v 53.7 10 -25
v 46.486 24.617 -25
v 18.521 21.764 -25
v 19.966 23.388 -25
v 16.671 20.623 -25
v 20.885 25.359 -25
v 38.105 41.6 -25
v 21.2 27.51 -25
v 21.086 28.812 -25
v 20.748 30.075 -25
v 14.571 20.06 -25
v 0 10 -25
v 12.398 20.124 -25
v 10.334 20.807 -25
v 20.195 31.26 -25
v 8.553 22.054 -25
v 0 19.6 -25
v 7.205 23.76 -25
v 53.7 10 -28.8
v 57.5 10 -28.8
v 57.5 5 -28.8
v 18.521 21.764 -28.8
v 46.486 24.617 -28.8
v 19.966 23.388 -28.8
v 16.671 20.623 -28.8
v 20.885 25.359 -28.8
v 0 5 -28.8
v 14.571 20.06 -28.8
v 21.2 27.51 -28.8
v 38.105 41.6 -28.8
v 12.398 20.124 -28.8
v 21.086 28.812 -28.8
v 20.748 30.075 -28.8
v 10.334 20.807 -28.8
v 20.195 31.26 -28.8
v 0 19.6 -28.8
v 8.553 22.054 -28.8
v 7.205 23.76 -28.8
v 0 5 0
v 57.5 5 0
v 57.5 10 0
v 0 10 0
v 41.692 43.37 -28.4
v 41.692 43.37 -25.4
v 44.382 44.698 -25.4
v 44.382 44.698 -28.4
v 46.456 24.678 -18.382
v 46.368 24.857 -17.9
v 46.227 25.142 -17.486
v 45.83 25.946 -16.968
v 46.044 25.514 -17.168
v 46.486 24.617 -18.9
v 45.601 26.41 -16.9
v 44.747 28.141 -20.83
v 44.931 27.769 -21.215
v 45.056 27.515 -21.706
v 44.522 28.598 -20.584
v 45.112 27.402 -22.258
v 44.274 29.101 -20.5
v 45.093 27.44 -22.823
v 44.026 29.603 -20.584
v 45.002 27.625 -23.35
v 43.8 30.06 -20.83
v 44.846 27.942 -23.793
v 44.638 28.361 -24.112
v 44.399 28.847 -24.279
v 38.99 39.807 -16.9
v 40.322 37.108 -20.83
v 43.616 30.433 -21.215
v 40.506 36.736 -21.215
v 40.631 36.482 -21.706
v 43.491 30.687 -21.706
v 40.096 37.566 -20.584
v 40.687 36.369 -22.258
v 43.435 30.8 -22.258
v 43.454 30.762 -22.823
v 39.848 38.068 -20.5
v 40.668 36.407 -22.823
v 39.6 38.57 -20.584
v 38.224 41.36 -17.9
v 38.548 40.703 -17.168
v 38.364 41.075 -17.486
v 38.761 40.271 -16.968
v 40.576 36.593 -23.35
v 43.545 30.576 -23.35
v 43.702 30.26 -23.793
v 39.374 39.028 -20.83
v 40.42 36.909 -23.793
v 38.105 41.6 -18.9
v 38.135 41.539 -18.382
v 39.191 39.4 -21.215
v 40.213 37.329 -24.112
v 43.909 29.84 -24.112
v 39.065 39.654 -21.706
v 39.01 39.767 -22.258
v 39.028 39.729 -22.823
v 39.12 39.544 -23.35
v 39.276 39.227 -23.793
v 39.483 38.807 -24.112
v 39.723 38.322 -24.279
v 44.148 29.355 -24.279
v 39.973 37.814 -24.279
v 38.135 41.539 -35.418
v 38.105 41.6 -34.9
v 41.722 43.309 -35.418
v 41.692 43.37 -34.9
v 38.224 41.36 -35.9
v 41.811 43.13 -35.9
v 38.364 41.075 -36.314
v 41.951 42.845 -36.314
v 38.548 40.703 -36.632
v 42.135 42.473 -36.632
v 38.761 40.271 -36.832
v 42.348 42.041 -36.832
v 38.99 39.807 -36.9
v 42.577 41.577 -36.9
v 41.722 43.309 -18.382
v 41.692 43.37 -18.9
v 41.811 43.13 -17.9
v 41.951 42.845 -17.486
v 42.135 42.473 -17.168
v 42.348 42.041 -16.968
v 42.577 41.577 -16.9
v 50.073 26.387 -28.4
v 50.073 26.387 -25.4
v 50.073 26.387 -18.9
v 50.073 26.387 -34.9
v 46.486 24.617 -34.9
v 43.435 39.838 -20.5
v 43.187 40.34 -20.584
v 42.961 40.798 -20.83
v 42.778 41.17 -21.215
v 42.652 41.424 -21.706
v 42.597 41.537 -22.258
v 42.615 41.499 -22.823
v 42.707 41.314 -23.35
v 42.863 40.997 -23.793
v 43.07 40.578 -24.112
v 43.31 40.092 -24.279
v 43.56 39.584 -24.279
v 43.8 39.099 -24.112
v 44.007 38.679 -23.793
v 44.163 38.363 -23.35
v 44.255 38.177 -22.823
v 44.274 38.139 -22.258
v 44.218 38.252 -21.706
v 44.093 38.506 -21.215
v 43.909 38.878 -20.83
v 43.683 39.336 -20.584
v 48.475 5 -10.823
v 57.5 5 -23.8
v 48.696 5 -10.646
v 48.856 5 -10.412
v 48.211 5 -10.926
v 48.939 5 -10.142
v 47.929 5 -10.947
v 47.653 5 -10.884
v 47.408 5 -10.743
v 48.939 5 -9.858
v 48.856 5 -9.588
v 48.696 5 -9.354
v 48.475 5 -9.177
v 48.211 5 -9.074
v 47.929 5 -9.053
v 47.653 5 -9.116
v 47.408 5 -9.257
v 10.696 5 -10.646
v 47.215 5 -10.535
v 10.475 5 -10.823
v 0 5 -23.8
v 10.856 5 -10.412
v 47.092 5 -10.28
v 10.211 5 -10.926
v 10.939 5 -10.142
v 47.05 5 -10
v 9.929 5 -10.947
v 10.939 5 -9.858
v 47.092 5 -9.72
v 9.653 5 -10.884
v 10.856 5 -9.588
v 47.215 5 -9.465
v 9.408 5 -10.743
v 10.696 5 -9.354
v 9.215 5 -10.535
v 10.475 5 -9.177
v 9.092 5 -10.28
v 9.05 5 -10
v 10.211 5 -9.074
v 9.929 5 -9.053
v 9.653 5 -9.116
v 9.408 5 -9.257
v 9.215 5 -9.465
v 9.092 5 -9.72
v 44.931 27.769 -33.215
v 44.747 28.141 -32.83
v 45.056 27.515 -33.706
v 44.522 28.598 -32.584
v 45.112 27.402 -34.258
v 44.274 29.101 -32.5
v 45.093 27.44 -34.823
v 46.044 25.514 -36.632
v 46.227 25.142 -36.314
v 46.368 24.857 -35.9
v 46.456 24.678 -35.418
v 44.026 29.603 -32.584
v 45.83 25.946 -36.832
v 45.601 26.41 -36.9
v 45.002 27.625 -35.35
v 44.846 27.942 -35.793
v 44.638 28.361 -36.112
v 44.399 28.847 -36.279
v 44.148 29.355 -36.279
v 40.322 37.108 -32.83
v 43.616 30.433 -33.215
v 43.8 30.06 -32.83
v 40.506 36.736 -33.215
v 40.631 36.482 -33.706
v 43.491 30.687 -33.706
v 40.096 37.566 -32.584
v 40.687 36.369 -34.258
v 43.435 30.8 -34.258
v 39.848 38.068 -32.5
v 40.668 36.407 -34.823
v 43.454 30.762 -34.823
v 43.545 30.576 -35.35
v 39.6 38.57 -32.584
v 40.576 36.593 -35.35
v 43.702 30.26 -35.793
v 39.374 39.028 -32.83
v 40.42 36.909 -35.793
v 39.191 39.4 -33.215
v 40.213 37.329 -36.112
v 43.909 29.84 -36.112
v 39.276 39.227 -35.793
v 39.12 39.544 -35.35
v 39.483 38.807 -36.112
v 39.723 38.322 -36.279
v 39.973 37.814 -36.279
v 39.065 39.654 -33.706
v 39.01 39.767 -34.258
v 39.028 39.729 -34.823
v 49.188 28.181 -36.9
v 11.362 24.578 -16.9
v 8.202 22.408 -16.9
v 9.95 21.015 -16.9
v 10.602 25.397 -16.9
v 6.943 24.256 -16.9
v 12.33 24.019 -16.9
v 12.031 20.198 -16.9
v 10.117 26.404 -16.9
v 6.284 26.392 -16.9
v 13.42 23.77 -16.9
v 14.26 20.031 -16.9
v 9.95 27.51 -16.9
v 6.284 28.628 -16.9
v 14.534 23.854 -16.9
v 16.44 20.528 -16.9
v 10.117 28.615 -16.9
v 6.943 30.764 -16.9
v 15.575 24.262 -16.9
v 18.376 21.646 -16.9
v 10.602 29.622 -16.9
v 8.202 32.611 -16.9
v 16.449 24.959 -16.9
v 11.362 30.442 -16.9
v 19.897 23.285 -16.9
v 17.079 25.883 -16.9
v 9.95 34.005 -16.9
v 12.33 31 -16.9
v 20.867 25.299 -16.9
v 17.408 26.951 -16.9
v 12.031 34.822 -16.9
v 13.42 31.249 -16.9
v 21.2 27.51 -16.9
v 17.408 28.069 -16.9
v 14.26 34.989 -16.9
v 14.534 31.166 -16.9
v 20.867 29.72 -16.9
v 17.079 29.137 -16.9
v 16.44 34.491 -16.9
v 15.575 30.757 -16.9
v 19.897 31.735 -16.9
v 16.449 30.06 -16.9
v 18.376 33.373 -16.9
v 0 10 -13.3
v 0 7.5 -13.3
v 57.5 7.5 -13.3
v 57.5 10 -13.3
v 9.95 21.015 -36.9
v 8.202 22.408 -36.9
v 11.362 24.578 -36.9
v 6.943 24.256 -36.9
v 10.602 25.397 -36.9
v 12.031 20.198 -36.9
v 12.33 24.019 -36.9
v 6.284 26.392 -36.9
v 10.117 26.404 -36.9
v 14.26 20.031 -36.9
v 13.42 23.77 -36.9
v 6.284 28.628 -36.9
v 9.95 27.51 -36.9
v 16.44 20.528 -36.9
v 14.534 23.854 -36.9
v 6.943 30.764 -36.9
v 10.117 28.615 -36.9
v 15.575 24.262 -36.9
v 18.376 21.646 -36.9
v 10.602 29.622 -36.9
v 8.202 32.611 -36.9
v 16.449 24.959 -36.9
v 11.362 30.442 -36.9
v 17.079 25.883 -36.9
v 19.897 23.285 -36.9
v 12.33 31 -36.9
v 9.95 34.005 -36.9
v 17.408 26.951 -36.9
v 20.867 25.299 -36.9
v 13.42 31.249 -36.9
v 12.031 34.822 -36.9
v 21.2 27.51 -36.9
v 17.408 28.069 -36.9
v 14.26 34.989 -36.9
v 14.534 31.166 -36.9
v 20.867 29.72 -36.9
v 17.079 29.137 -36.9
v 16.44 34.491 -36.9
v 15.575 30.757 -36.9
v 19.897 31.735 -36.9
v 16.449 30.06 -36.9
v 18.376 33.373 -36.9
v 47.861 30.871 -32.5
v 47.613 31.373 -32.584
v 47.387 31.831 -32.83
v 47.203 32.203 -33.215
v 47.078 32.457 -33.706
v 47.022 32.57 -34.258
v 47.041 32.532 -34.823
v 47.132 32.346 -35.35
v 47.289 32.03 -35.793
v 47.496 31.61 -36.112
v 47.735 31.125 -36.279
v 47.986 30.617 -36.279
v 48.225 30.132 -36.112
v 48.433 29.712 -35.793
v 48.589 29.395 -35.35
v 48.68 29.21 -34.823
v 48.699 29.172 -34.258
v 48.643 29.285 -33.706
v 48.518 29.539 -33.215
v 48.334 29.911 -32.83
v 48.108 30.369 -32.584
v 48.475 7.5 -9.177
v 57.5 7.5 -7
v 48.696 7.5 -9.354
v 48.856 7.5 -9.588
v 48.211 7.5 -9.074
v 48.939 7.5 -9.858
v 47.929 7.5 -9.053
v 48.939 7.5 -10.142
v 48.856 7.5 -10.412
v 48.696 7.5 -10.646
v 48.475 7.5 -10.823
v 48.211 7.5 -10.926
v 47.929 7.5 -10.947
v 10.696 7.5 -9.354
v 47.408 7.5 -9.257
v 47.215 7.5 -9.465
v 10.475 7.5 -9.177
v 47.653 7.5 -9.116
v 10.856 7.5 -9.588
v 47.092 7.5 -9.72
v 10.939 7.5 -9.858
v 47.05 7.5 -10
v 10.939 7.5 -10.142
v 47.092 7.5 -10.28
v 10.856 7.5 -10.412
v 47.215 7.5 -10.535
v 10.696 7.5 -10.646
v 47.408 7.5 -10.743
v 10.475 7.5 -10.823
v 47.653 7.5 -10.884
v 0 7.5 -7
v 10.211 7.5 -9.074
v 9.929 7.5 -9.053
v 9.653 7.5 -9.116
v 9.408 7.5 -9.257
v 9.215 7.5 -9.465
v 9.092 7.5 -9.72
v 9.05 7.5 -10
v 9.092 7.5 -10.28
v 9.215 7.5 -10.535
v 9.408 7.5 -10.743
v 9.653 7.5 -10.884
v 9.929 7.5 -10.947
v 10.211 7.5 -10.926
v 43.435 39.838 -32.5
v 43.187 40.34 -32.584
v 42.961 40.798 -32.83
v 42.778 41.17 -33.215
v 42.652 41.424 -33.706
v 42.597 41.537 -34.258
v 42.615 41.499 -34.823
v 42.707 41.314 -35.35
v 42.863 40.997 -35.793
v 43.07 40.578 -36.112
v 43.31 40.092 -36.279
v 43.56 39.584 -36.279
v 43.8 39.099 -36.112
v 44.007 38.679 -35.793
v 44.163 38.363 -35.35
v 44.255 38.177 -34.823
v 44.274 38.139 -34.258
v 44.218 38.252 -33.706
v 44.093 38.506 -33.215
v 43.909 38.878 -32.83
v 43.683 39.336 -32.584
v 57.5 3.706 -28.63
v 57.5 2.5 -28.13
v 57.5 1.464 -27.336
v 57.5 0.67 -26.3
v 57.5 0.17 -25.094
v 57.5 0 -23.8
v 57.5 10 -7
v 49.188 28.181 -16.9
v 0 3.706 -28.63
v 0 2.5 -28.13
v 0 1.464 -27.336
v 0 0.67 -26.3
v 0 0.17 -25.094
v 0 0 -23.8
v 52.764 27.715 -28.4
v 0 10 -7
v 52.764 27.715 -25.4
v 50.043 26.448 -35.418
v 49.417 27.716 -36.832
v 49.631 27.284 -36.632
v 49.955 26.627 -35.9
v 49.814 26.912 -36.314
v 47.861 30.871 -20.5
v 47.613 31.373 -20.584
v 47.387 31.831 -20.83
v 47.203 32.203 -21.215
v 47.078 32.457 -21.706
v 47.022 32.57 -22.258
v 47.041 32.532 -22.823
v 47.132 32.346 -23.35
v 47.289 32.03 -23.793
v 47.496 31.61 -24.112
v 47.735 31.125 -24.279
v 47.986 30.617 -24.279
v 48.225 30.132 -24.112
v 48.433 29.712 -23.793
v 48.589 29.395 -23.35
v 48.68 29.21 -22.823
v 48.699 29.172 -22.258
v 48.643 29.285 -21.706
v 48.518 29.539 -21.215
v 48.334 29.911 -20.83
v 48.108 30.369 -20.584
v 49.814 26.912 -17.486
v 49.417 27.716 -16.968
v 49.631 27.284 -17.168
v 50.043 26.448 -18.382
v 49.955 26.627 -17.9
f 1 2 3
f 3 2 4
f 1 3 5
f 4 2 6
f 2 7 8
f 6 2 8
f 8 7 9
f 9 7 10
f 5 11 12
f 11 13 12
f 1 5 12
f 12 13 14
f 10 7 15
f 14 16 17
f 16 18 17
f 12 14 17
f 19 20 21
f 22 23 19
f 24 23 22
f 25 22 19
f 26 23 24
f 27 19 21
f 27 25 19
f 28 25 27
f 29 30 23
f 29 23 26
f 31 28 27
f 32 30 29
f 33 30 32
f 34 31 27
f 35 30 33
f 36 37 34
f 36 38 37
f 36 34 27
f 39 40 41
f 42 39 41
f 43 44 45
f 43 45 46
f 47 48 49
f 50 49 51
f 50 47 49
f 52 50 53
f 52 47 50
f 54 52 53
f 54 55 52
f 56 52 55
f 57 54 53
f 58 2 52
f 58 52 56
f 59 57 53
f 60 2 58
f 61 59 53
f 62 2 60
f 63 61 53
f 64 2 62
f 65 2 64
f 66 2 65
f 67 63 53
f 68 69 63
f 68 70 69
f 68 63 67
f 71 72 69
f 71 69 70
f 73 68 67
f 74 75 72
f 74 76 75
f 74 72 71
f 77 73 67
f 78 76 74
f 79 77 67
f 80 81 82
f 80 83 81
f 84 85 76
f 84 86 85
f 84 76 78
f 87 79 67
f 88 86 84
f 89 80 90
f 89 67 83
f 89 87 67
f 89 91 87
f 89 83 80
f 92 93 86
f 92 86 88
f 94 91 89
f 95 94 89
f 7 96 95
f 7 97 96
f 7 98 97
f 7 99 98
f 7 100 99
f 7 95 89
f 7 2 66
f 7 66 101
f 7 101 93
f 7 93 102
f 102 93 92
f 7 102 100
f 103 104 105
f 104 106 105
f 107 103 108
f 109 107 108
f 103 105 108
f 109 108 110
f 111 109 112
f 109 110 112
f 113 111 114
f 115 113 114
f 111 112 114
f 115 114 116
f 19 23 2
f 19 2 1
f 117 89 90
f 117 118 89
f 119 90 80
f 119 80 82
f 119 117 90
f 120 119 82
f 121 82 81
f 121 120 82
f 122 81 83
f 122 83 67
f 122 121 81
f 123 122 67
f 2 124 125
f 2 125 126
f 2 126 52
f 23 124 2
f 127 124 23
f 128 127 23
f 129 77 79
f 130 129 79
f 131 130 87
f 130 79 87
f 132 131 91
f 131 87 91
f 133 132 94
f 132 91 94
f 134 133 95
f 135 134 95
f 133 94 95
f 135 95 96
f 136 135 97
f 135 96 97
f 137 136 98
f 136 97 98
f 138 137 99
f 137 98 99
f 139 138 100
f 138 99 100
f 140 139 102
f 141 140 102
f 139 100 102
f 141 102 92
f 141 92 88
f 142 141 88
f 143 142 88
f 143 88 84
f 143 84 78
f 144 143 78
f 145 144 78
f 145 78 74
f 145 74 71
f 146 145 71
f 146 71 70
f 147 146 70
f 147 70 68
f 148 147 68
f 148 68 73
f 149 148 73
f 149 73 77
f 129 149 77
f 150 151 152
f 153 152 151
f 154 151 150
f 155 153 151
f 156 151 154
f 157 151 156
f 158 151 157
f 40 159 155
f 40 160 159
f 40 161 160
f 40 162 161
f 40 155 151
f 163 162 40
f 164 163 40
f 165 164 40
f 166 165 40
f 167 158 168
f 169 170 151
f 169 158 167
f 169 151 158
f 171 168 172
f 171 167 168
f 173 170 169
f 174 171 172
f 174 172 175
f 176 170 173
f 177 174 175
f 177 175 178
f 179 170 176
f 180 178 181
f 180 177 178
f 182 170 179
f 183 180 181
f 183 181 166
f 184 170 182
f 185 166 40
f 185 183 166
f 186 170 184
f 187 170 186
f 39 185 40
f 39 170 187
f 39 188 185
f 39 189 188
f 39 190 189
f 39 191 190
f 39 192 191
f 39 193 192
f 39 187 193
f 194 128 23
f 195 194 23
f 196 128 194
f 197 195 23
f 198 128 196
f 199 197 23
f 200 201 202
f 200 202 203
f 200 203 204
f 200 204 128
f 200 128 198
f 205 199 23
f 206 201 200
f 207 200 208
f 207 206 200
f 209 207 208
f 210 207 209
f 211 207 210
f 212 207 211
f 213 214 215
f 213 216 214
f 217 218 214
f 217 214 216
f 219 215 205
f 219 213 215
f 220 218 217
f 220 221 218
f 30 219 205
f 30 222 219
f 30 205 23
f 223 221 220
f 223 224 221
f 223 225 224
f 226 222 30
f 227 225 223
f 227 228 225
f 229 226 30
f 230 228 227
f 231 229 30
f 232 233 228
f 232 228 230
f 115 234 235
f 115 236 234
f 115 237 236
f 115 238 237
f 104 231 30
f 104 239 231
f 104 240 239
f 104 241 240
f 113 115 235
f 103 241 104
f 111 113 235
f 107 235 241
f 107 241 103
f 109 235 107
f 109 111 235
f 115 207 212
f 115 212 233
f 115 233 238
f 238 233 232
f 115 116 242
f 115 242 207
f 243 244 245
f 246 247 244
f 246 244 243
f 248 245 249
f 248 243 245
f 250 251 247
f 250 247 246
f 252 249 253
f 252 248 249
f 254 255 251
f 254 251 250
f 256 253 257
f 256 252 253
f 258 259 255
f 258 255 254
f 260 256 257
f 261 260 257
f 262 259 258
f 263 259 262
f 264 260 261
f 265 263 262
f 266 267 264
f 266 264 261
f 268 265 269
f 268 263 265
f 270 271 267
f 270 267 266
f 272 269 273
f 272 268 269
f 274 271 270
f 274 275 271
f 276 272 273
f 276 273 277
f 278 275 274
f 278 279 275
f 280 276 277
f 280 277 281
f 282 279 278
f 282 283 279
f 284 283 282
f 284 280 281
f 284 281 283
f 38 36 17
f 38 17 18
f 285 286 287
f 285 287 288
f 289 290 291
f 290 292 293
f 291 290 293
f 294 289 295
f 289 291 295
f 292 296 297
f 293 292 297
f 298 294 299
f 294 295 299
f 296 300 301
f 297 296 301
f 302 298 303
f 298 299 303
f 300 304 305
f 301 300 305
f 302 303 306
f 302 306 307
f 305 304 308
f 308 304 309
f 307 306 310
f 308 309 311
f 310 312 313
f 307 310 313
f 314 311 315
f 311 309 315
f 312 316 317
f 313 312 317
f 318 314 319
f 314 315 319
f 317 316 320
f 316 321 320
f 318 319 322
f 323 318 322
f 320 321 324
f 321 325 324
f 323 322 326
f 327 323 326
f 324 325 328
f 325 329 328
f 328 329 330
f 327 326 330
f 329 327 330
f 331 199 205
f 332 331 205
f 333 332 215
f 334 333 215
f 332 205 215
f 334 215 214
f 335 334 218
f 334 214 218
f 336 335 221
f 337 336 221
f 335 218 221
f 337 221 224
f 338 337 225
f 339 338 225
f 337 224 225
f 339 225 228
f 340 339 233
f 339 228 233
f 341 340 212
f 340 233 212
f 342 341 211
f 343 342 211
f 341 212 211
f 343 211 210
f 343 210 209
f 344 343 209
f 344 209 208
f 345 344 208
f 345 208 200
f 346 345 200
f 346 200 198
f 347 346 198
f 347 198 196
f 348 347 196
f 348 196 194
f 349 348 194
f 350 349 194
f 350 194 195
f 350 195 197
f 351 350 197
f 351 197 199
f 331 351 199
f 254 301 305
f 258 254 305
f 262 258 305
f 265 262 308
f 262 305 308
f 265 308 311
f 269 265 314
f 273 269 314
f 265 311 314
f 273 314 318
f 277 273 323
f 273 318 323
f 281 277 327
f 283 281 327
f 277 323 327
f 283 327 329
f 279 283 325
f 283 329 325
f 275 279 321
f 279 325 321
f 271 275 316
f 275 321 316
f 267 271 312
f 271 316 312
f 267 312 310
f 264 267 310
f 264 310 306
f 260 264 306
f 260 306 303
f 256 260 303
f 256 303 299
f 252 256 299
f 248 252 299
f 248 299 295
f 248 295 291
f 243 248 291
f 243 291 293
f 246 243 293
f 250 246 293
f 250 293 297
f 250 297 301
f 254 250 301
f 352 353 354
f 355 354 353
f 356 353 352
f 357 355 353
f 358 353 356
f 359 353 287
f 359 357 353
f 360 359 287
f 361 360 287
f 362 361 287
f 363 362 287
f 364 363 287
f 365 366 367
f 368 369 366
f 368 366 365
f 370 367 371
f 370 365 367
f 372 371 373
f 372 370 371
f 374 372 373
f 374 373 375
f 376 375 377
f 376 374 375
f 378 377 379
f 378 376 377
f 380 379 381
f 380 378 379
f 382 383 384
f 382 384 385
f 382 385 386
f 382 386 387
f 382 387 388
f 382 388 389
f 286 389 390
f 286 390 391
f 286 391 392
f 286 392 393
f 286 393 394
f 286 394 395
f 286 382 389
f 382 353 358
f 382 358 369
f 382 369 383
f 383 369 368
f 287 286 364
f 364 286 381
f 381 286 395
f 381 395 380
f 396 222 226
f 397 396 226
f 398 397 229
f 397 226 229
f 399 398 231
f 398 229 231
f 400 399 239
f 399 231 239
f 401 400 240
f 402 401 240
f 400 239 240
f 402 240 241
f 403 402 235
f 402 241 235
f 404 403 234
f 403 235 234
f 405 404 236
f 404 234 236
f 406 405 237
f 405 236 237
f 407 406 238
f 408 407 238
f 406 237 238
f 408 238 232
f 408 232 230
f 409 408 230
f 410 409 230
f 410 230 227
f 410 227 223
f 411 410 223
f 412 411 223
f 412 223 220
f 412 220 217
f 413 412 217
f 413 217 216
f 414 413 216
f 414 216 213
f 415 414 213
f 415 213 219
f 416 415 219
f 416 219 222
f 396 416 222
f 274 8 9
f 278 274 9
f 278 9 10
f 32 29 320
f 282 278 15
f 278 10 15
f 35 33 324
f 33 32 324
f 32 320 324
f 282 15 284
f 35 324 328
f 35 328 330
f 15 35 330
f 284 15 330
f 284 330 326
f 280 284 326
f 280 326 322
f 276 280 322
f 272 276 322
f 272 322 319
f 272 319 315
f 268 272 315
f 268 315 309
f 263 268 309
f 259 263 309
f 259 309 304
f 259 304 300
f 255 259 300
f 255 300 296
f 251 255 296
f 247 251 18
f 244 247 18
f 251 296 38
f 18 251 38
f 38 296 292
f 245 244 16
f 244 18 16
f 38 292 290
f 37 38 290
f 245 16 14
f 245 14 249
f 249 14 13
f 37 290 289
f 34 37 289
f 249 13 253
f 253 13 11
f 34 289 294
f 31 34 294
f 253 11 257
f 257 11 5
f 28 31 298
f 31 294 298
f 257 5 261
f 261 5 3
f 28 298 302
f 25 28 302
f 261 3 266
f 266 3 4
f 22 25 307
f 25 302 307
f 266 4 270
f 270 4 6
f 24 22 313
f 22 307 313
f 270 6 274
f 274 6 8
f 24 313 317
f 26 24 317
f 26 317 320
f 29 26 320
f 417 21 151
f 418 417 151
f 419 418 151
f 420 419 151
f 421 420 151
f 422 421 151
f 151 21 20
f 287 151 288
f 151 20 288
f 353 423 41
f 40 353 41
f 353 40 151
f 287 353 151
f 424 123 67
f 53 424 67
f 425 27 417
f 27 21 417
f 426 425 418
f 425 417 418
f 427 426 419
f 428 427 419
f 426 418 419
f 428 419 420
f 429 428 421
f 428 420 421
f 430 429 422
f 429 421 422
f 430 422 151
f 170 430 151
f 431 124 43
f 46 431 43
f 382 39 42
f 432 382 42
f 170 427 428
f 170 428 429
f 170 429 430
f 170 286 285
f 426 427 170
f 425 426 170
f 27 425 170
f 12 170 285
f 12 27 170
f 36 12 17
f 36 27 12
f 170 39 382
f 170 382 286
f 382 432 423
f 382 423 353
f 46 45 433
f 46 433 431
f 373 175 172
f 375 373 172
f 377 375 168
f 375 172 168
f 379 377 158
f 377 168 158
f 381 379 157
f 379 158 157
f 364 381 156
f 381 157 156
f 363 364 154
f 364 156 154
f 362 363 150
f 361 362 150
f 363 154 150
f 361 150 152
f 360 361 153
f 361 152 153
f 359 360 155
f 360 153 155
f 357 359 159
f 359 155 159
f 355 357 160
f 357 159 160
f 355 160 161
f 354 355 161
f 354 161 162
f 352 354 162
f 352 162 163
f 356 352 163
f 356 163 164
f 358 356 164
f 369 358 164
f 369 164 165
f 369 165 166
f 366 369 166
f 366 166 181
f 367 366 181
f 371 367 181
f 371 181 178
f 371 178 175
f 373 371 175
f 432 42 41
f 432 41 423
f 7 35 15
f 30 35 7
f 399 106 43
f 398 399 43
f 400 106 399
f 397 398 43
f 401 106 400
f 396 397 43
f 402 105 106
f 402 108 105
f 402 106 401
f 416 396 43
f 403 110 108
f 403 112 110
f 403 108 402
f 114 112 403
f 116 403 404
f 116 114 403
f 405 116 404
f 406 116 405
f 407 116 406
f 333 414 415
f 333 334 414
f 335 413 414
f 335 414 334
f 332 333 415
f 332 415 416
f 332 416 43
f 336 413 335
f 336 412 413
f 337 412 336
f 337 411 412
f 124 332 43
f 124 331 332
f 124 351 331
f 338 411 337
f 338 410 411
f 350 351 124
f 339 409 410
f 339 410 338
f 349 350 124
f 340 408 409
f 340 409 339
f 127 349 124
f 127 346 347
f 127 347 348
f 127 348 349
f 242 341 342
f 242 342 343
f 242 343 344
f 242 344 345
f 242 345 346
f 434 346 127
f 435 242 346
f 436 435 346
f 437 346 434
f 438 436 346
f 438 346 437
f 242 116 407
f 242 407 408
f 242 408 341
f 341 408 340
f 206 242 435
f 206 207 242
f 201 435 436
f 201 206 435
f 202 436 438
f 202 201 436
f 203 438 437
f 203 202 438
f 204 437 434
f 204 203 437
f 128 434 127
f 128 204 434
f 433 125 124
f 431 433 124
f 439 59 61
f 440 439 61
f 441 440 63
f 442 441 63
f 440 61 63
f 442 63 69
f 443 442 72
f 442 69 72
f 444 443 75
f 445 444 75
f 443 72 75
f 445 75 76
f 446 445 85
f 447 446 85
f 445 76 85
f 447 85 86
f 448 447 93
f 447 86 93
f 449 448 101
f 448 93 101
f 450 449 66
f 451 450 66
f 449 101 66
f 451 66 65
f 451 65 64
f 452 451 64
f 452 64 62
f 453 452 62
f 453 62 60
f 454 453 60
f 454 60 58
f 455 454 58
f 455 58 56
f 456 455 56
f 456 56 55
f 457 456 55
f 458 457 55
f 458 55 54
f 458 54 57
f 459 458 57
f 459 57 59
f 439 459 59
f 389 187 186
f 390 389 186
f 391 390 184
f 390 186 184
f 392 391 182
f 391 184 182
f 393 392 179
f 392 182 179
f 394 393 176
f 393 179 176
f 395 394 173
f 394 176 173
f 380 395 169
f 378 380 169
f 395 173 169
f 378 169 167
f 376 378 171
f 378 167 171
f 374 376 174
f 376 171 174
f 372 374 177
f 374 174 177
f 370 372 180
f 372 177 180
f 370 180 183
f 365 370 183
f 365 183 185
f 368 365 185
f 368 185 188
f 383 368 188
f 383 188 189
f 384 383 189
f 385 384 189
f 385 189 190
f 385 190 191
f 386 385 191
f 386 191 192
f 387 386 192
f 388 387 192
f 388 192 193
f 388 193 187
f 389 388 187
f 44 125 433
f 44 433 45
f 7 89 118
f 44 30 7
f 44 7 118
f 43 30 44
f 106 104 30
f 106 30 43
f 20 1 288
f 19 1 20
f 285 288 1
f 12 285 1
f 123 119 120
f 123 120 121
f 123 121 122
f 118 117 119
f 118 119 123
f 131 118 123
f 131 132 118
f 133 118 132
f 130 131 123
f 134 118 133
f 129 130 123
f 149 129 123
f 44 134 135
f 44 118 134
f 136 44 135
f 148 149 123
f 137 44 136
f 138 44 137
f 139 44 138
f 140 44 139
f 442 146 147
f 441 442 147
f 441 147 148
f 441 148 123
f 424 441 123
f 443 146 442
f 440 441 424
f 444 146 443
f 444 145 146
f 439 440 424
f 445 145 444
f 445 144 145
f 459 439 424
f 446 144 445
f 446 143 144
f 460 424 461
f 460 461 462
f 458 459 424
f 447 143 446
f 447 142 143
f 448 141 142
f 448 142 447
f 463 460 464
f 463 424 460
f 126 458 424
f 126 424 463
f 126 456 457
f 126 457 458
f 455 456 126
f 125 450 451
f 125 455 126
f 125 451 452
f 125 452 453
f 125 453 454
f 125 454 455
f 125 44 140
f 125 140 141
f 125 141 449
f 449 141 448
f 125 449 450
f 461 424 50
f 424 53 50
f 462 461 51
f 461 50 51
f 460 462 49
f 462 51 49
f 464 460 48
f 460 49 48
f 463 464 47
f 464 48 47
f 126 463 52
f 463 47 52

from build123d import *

# Parameters (mm, degrees)
BOSS_EXTRUDE1_DEPTH      = 57.5
FILLET1_R                = 5
BOSS_EXTRUDE2_DEPTH      = 3.8
BOSS_EXTRUDE3_DEPTH      = 8.1
BOSS_EXTRUDE3_DEPTH_BACK = 11.9
SKETCH3_R                = 7.5
HOLE1_D                  = 7.5
BOSS_EXTRUDE4_DEPTH      = 8.1
BOSS_EXTRUDE4_DEPTH_BACK = 11.9
SKETCH7_W                = 3
SKETCH7_H                = 18.938620175
BOSS_EXTRUDE5_DEPTH      = 3
HOLE2_D                  = 3.8
HOLE2_DEPTH              = 4
FILLET2_R                = 2
HOLE3_D                  = 1.9
LPATTERN1_COUNT          = 2
LPATTERN1_PITCH          = 38


with BuildPart() as part:
    # Sketch1 → Boss-Extrude1 (new body)
    with BuildSketch(Plane(origin=(0, 0, 0), x_dir=(0, 0, -1), z_dir=(1, 0, 0))):
        Polygon((0, 5), (0, 10), (7, 10), (7, 7.5), (13.3, 7.5), (13.3, 10), (28.8, 10), (28.8, 0), (23.8, 0), (23.8, 5), align=None)
    extrude(amount=BOSS_EXTRUDE1_DEPTH)

    # Fillet1
    fillet1_edges = [part.edges().sort_by_distance(p)[0] for p in [
        (28.75, 0, -28.8),
    ]]
    fillet(fillet1_edges, radius=FILLET1_R - 0.0001)  # a hair under: the kernel refuses the full size

    # Sketch2 → Boss-Extrude2 (add)
    with BuildSketch(Plane(origin=(0, 0, -28.8), x_dir=(-1, 0, 0), z_dir=(0, 0, -1))):
        Polygon((-53.7, 10), (0, 10), (0, 19.6), (-38.105117767, 41.6), align=None)
    extrude(amount=-BOSS_EXTRUDE2_DEPTH)

    # Sketch3 → Boss-Extrude3 (add, two sides: drawn at the far end of the back side and taken through both)
    with BuildSketch(Plane.XY.offset(-25).offset(-BOSS_EXTRUDE3_DEPTH_BACK)):
        with Locations((13.7, 27.509698688)):
            Circle(SKETCH3_R)
    extrude(amount=BOSS_EXTRUDE3_DEPTH + BOSS_EXTRUDE3_DEPTH_BACK)

    # Hole1 (through all)
    with Locations(Plane.XY.offset(-16.9)):
        with Locations((13.7, 27.509698688)):
            Hole(HOLE1_D / 2)

    # Sketch6 → Boss-Extrude4 (add, two sides: drawn at the far end of the back side and taken through both)
    with BuildSketch(Plane.XY.offset(-25).offset(-BOSS_EXTRUDE4_DEPTH_BACK)):
        Polygon((38.105117767, 41.6), (41.692091359, 43.370203505), (50.073394311, 26.387120893), (46.486420719, 24.616917389), align=None)
    extrude(amount=BOSS_EXTRUDE4_DEPTH + BOSS_EXTRUDE4_DEPTH_BACK)

    # Sketch7 → Boss-Extrude5 (add)
    with BuildSketch(Plane(origin=(50.738305729, 25.039807043, 0), x_dir=(0, 0, -1), z_dir=(0.8967433980837525, 0.44255087616363914, 0))):
        with Locations((26.9, 10.971762018)):
            Rectangle(SKETCH7_W, SKETCH7_H)
    extrude(amount=BOSS_EXTRUDE5_DEPTH)

    # Hole2
    with Locations(Plane(origin=(50.738305729, 25.039807043, 0), x_dir=(0, 0, -1), z_dir=(0.8967433980837525, 0.44255087616363914, 0))):
        with Locations((34.4, 6.502451931), (22.4, 6.502451931), (22.4, 16.502451931), (34.4, 16.502451931)):
            Hole(HOLE2_D / 2, depth=HOLE2_DEPTH)

    # Fillet2
    fillet2_edges = [part.edges().sort_by_distance(p)[0] for p in [
        (39.898604563, 42.485101752, -36.9),
        (48.279907515, 25.502019141, -36.9),
        (48.279907515, 25.502019141, -16.9),
        (39.898604563, 42.485101752, -16.9),
    ]]
    fillet(fillet2_edges, radius=FILLET2_R)

    # Hole3 (through all)
    with Locations(Plane(origin=(0, 7.5, 0), x_dir=(1, 0, 0), z_dir=(0, 1, 0))):
        with Locations((10, 10)):
            hole3 = Hole(HOLE3_D / 2)

    # LPattern1: Hole3 ×2
    with Locations(*[(i * LPATTERN1_PITCH, 0, 0) for i in range(1, LPATTERN1_COUNT)]):
        add(hole3, mode=Mode.SUBTRACT)


solid = part.part
